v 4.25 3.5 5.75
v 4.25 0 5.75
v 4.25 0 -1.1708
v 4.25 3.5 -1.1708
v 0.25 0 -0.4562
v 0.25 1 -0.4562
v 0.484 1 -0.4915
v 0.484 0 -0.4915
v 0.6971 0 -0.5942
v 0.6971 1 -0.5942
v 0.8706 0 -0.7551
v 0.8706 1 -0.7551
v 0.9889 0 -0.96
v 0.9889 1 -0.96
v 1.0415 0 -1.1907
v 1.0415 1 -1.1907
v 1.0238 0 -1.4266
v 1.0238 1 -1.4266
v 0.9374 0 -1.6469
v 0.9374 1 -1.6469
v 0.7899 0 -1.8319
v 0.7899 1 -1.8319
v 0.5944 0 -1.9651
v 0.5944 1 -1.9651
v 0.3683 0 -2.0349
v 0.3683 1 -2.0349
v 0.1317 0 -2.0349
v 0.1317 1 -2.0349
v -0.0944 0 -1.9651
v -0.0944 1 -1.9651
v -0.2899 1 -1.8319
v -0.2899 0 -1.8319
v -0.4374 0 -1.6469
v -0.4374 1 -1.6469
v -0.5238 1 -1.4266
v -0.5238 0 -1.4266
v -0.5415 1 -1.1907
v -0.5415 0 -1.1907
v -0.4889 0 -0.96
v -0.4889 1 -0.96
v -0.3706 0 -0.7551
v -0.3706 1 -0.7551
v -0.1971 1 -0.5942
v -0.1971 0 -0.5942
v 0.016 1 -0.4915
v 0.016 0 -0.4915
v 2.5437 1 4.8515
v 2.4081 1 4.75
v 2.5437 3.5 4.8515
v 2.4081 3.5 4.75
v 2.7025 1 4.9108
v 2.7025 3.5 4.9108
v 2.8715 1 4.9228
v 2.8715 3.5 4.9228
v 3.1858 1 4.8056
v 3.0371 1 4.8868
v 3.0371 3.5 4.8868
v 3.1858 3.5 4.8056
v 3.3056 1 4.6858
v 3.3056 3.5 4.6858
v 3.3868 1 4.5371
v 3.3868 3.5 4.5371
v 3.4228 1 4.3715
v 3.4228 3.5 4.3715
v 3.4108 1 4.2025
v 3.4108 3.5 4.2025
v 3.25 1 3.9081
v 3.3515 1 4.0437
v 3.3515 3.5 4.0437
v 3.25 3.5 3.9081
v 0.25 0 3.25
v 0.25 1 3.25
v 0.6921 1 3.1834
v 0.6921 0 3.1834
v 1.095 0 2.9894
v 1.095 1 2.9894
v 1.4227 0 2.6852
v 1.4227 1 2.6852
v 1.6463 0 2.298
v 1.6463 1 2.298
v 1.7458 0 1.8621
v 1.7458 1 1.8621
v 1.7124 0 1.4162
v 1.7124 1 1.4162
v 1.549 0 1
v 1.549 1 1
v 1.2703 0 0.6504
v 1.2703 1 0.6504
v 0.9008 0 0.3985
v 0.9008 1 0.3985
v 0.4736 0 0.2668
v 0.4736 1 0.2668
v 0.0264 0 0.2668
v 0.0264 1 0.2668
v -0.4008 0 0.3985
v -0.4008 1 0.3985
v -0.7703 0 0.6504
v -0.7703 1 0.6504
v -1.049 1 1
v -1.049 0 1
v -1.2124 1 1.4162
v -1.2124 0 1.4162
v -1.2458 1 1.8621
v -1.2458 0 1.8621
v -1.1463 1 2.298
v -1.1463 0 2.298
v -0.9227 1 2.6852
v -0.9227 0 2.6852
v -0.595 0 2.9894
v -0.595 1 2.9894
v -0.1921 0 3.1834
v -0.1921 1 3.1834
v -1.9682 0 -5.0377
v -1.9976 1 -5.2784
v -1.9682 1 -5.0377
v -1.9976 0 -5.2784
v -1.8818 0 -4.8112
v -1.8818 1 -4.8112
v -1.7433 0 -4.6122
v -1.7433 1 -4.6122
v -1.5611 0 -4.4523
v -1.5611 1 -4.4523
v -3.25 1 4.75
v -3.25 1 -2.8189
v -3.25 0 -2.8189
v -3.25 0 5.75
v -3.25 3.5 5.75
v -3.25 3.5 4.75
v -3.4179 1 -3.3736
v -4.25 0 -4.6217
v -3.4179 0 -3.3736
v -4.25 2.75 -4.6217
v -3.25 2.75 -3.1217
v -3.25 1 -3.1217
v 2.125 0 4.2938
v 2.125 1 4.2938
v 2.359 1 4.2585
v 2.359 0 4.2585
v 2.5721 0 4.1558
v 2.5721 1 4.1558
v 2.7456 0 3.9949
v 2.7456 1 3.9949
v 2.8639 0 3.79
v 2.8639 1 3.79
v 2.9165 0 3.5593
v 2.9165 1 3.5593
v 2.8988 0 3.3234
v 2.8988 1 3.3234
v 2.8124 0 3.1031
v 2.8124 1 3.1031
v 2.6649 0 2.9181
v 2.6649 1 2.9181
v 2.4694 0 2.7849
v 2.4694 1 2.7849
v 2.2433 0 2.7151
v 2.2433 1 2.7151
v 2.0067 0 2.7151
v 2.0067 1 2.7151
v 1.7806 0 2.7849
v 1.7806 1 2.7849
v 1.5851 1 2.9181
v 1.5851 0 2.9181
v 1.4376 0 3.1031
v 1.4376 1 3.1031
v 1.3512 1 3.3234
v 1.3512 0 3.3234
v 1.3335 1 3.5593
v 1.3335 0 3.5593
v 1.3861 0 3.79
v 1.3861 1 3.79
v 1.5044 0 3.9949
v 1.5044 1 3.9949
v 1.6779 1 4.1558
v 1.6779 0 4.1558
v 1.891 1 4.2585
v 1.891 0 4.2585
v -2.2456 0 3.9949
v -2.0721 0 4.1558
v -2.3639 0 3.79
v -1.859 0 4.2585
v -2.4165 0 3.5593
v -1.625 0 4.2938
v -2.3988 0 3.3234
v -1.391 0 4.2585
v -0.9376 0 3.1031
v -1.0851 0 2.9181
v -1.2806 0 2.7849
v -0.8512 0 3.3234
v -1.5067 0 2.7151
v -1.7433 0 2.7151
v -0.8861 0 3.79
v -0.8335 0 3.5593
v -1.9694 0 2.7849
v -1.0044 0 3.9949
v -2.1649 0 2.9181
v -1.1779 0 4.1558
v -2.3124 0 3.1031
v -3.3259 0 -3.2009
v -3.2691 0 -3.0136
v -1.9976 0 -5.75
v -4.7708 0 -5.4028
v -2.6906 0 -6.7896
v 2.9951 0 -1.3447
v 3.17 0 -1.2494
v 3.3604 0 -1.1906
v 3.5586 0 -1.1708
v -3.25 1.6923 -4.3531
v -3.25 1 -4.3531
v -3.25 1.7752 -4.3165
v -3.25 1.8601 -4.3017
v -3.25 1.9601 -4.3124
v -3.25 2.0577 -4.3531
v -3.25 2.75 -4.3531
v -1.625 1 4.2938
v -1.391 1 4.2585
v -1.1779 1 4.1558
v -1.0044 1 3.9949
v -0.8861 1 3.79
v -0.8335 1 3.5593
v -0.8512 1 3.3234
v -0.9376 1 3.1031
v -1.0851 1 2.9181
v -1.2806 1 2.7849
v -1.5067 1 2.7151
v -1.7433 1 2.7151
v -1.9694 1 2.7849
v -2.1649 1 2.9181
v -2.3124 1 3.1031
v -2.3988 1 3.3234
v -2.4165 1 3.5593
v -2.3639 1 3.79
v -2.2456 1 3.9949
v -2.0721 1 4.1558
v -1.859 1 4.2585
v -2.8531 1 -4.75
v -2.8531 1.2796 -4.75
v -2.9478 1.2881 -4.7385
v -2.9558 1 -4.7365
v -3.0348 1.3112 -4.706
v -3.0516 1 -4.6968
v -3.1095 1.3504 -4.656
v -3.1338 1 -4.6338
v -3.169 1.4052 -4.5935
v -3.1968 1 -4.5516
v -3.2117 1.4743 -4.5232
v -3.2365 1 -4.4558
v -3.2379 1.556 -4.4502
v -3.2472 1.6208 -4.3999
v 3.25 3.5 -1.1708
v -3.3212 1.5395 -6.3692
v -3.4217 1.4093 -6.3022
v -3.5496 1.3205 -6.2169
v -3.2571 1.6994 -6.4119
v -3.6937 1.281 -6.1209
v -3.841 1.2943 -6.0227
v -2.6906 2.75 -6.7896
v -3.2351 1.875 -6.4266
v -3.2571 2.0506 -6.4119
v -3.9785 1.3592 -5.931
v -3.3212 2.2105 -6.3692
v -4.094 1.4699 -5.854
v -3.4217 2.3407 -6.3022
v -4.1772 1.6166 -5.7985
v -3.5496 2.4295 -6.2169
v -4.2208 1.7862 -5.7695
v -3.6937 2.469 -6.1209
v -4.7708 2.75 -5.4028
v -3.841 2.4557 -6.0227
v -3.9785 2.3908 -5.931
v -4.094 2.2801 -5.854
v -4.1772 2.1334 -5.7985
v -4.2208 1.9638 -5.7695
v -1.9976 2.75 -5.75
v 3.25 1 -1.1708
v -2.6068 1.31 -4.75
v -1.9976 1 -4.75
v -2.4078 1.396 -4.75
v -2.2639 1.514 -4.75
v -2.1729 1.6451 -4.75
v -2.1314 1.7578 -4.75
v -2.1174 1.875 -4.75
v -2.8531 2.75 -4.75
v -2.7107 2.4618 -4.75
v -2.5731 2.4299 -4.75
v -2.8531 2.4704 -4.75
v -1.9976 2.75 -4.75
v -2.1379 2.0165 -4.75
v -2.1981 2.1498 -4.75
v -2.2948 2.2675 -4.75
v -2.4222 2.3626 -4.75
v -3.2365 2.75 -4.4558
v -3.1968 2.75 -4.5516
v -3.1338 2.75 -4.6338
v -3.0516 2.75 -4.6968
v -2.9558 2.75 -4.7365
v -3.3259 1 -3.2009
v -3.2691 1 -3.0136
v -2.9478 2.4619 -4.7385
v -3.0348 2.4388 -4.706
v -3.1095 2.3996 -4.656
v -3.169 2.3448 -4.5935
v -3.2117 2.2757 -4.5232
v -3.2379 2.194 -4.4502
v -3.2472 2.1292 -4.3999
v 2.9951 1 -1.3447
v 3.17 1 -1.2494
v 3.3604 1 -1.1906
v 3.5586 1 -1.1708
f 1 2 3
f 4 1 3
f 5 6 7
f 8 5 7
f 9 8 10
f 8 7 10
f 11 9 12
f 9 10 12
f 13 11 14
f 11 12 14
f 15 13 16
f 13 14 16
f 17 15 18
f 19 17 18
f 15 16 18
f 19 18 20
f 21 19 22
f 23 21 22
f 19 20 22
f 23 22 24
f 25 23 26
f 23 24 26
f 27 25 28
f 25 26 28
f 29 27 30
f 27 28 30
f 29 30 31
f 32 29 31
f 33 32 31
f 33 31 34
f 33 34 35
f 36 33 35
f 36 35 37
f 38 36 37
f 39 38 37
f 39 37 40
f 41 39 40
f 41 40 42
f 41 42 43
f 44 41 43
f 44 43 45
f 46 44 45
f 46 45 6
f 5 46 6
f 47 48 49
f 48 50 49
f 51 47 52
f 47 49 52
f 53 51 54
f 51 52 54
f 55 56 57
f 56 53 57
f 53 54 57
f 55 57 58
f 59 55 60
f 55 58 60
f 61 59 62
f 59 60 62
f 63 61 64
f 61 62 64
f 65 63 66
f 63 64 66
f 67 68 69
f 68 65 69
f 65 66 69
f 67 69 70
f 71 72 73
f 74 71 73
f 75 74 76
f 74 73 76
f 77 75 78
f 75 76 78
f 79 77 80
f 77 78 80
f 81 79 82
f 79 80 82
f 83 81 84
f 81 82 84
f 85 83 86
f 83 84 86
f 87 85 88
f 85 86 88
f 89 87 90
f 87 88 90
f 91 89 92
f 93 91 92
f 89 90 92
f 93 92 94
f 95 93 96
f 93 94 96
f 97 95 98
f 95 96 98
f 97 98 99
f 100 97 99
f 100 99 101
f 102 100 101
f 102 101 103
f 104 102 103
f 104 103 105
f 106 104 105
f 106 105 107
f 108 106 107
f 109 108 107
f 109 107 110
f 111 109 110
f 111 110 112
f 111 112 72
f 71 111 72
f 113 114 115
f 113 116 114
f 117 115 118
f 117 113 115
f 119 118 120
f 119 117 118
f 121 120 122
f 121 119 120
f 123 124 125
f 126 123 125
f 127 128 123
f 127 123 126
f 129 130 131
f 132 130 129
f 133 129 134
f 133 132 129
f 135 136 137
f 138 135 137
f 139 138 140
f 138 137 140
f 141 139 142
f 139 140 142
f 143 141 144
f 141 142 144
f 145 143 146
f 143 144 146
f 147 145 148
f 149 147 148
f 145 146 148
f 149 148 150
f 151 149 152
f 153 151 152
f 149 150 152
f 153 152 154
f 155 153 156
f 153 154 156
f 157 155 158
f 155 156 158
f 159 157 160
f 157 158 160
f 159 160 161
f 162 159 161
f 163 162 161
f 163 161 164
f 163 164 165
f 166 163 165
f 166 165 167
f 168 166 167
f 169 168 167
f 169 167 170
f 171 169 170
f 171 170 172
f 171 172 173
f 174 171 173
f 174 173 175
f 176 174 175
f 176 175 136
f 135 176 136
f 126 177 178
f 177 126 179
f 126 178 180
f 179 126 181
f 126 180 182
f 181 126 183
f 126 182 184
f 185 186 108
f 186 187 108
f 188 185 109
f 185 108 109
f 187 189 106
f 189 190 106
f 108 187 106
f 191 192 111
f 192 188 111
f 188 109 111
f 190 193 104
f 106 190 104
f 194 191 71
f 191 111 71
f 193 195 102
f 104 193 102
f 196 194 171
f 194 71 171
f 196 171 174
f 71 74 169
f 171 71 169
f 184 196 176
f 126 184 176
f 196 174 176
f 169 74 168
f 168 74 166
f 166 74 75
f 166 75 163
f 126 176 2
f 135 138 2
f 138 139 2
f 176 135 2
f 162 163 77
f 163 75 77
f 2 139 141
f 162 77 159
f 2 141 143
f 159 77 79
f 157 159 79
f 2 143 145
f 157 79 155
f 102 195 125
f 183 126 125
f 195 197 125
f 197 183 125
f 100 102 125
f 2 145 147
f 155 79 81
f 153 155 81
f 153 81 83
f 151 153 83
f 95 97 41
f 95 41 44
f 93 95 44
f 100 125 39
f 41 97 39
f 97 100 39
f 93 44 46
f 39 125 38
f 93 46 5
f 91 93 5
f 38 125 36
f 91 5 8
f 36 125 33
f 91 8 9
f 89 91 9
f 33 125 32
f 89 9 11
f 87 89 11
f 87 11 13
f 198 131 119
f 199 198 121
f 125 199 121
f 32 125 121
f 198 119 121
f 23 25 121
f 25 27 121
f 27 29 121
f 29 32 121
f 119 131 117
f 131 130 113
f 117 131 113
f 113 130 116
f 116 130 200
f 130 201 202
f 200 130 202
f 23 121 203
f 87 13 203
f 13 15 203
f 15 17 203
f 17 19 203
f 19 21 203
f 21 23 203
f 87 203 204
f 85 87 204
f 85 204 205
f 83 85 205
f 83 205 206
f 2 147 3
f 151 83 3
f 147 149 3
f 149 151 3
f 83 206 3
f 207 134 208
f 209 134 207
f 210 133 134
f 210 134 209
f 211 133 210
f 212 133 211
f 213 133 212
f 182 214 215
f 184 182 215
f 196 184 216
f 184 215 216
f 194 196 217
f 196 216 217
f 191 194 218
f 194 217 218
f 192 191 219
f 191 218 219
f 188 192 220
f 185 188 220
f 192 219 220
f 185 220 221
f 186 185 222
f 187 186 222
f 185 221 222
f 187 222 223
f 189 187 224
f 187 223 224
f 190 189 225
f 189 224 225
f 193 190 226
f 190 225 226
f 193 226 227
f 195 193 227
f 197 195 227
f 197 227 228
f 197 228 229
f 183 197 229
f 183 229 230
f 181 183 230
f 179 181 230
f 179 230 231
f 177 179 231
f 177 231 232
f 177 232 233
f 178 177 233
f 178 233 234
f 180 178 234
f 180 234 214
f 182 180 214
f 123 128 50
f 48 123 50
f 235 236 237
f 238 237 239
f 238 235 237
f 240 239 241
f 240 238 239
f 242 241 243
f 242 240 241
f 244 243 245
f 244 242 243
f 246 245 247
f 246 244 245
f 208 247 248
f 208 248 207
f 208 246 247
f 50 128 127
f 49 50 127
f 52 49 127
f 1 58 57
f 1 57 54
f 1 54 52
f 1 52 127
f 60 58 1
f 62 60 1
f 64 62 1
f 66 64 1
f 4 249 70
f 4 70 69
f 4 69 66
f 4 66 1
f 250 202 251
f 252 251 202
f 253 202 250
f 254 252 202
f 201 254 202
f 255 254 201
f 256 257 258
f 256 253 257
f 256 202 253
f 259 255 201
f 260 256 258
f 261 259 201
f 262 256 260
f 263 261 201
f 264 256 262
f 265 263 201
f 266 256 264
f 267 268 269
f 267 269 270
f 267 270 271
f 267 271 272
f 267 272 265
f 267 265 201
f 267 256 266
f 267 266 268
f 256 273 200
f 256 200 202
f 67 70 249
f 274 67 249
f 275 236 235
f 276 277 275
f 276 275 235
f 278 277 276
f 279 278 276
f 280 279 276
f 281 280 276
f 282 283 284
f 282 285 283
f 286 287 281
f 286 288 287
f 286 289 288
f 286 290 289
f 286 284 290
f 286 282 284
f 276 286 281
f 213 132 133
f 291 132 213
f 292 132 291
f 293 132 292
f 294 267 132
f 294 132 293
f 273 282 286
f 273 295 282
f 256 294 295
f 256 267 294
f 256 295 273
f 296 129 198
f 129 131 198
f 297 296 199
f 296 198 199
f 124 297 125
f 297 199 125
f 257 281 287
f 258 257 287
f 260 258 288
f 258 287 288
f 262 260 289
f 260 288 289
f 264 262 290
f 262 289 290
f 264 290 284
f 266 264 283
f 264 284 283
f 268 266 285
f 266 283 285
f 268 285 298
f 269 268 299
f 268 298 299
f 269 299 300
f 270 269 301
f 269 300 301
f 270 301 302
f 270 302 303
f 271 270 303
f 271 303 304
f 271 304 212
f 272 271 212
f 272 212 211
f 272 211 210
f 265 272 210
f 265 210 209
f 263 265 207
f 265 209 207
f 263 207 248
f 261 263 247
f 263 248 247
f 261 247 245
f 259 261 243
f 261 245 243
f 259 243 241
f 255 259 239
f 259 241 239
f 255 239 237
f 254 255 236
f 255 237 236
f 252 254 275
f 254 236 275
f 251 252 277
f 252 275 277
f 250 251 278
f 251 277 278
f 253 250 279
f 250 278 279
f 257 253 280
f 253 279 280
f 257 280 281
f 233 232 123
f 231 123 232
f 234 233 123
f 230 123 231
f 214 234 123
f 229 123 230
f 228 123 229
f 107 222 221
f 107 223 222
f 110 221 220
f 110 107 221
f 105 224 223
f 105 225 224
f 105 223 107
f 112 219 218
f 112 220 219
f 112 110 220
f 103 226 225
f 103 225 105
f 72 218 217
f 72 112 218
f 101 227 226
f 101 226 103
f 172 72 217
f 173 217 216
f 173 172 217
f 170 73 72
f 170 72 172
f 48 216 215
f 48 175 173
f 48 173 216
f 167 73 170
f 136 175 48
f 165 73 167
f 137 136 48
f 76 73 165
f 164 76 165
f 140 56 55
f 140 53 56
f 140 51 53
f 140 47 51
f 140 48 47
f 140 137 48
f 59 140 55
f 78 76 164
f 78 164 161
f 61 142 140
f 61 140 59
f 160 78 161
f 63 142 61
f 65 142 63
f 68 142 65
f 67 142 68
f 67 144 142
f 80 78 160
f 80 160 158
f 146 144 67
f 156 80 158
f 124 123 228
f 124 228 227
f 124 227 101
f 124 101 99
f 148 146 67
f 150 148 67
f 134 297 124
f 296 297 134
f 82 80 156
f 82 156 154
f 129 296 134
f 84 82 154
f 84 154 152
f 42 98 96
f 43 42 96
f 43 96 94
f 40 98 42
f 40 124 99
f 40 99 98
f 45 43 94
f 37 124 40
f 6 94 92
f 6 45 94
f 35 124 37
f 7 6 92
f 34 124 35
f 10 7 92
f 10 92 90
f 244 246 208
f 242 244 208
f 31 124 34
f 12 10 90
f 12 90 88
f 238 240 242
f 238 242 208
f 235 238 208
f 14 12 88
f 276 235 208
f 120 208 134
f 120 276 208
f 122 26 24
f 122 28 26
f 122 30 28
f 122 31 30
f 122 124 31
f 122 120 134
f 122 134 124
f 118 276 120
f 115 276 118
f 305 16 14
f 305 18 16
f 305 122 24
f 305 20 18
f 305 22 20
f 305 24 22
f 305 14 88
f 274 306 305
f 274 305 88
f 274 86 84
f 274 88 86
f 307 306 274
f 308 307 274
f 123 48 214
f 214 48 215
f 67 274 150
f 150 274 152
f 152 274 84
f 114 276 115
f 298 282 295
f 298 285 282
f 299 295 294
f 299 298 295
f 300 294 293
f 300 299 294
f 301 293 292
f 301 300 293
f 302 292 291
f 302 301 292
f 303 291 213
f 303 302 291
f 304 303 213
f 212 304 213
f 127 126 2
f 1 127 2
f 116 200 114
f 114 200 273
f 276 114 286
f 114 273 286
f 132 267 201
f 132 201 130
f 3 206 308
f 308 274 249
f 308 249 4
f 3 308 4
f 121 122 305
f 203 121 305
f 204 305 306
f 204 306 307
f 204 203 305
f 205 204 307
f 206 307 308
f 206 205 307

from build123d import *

# Parameters (mm, degrees)
SKETCH1_W                     = 8.5
SKETCH1_H                     = 11.5
BOSS_EXTRUDE1_DEPTH           = 3.5
SKETCH2_W                     = 6.5
SKETCH2_H                     = 9.5
CUT_EXTRUDE1_DEPTH            = 2.5
SKETCH3_R                     = 1.5
CUT_EXTRUDE2_DEPTH            = 8.574628704
SKETCH6_R                     = 0.5953125
CUT_EXTRUDE5_DEPTH            = 2.5
SKETCH7_R                     = 0.79375
CUT_EXTRUDE6_DEPTH            = 8.574628704
BOSS_EXTRUDE2_DEPTH           = 3.5
SKETCH14_W                    = 5.965258944
SKETCH14_H                    = 5.132960456
CUT_EXTRUDE8_DEPTH            = 0.75
TAP_DRILL_FOR_0_80_TAP1_D     = 1.19126
TAP_DRILL_FOR_0_80_TAP1_DEPTH = 7.11
TAP_DRILL_FOR_0_80_TAP1_TIP   = 0.357890611
CUT_EXTRUDE7_REACH            = 11.006
FILLET5_R                     = 1
FILLET6_R                     = 0.396875


with BuildPart() as part:
    # Sketch1 → Boss-Extrude1 (new body)
    with BuildSketch(Plane(origin=(0, 0, 0), x_dir=(1, 0, 0), z_dir=(0, 1, 0))):
        Rectangle(SKETCH1_W, SKETCH1_H)
    extrude(amount=BOSS_EXTRUDE1_DEPTH)

    # Sketch2 → Cut-Extrude1 (cut)
    with BuildSketch(Plane(origin=(0, 3.5, 0), x_dir=(1, 0, 0), z_dir=(0, 1, 0))):
        Rectangle(SKETCH2_W, SKETCH2_H)
    extrude(amount=-CUT_EXTRUDE1_DEPTH, mode=Mode.SUBTRACT)

    # Sketch3 → Cut-Extrude2 (cut, through all)
    with BuildSketch(Plane(origin=(0, 1, 0), x_dir=(1, 0, 0), z_dir=(0, 1, 0))):
        with Locations(Location((0.25, -1.75, 0), (0, 0, 270))):
            Circle(SKETCH3_R)
    extrude(amount=-CUT_EXTRUDE2_DEPTH, mode=Mode.SUBTRACT)

    # Sketch6 → Cut-Extrude5 (cut)
    with BuildSketch(Plane(origin=(0, 3.5, 0), x_dir=(1, 0, 0), z_dir=(0, 1, 0))):
        with Locations((2.829050494, -4.329050494)):
            Circle(SKETCH6_R)
    extrude(amount=-CUT_EXTRUDE5_DEPTH, mode=Mode.SUBTRACT)

    # Sketch7 → Cut-Extrude6 (cut, through all)
    with BuildSketch(Plane(origin=(0, 1, 0), x_dir=(1, 0, 0), z_dir=(0, 1, 0))):
        with Locations(Location((0.25, 1.25, 0), (0, 0, 270))):
            Circle(SKETCH7_R)
        with Locations(Location((-1.625, -3.5, 0), (0, 0, 270))):
            Circle(SKETCH7_R)
        with Locations(Location((2.125, -3.5, 0), (0, 0, 270))):
            Circle(SKETCH7_R)
    extrude(amount=-CUT_EXTRUDE6_DEPTH, mode=Mode.SUBTRACT)

    # Sketch9 → Boss-Extrude2 (add)
    with BuildSketch(Plane(origin=(0, 3.5, 0), x_dir=(1, 0, 0), z_dir=(0, 1, 0))):
        Polygon((-2.69064642, 6.789569053), (-4.770772156, 5.402818562), (-4.001541387, 4.248972409), (-3.411634369, 4.642243754), (-2.511322669, 5.242451554), (-1.921415651, 5.635722899), align=None)
    extrude(amount=-BOSS_EXTRUDE2_DEPTH)

    # Sketch14 → Cut-Extrude8 (cut)
    with BuildSketch(Plane(origin=(0, 3.5, 0), x_dir=(1, 0, 0), z_dir=(0, 1, 0))):
        with Locations((-3.25, 4.75)):
            Rectangle(SKETCH14_W, SKETCH14_H)
    extrude(amount=-CUT_EXTRUDE8_DEPTH, mode=Mode.SUBTRACT)

    # Tap Drill for #0-80 Tap1
    with Locations(Plane(origin=(-3.961538462, 0, -5.942307692), x_dir=(-0.8320502943378434, 0, 0.5547001962252295), z_dir=(-0.5547001962252295, 0, -0.8320502943378434))):
        with Locations((-0.27742214, 1.875)):
            Hole(TAP_DRILL_FOR_0_80_TAP1_D / 2, depth=TAP_DRILL_FOR_0_80_TAP1_DEPTH)
            with Locations((0, 0, -(TAP_DRILL_FOR_0_80_TAP1_DEPTH + TAP_DRILL_FOR_0_80_TAP1_TIP / 2))):  # 118° drill point
                Cone(0, TAP_DRILL_FOR_0_80_TAP1_D / 2, TAP_DRILL_FOR_0_80_TAP1_TIP, mode=Mode.SUBTRACT)

    # Sketch13 → Cut-Extrude7 (cut, up to next)
    with BuildSketch(Plane(origin=(0, 3.5, 0), x_dir=(1, 0, 0), z_dir=(0, 1, 0)), mode=Mode.PRIVATE) as cut_extrude7_sk1:
        Polygon((-1.997600385, 5.75), (-1.997600385, 4.75), (3.25, 1.170806318), (4.25, 1.170806318), (4.25, 5.75), align=None)
    cut_extrude7_tool1 = extrude(cut_extrude7_sk1.sketch, amount=-CUT_EXTRUDE7_REACH, mode=Mode.PRIVATE) & part.part
    # Sketch13 → Cut-Extrude7 (cut, up to next)
    with BuildSketch(Plane(origin=(0, 3.5, 0), x_dir=(1, 0, 0), z_dir=(0, 1, 0)), mode=Mode.PRIVATE) as cut_extrude7_sk2:
        Polygon((-4.25, 4.621660328), (-3.25, 3.121660328), (-3.25, -5.75), (-4.25, -5.75), align=None)
    cut_extrude7_tool2 = extrude(cut_extrude7_sk2.sketch, amount=-CUT_EXTRUDE7_REACH, mode=Mode.PRIVATE) & part.part
    add(cut_extrude7_tool1.solids().sort_by_distance((1.797917, 3.5, -3.996239))[0], mode=Mode.SUBTRACT)
    add(cut_extrude7_tool2.solids().sort_by_distance((-3.762992, 3.5, 0.929426))[0], mode=Mode.SUBTRACT)

    # Fillet5
    fillet5_edges = [part.edges().sort_by_distance(p)[0] for p in [
        (3.25, 0.5, -1.170806318),
        (-1.997600385, 0.5, -4.75),
        (-3.25, 0.5, -3.121660328),
    ]]
    fillet(fillet5_edges, radius=FILLET5_R)

    # Fillet6
    fillet6_edges = [part.edges().sort_by_distance(p)[0] for p in [
        (-3.25, 1.195357051, -4.75),
        (-3.25, 2.554642949, -4.75),
    ]]
    fillet(fillet6_edges, radius=FILLET6_R)


solid = part.part
